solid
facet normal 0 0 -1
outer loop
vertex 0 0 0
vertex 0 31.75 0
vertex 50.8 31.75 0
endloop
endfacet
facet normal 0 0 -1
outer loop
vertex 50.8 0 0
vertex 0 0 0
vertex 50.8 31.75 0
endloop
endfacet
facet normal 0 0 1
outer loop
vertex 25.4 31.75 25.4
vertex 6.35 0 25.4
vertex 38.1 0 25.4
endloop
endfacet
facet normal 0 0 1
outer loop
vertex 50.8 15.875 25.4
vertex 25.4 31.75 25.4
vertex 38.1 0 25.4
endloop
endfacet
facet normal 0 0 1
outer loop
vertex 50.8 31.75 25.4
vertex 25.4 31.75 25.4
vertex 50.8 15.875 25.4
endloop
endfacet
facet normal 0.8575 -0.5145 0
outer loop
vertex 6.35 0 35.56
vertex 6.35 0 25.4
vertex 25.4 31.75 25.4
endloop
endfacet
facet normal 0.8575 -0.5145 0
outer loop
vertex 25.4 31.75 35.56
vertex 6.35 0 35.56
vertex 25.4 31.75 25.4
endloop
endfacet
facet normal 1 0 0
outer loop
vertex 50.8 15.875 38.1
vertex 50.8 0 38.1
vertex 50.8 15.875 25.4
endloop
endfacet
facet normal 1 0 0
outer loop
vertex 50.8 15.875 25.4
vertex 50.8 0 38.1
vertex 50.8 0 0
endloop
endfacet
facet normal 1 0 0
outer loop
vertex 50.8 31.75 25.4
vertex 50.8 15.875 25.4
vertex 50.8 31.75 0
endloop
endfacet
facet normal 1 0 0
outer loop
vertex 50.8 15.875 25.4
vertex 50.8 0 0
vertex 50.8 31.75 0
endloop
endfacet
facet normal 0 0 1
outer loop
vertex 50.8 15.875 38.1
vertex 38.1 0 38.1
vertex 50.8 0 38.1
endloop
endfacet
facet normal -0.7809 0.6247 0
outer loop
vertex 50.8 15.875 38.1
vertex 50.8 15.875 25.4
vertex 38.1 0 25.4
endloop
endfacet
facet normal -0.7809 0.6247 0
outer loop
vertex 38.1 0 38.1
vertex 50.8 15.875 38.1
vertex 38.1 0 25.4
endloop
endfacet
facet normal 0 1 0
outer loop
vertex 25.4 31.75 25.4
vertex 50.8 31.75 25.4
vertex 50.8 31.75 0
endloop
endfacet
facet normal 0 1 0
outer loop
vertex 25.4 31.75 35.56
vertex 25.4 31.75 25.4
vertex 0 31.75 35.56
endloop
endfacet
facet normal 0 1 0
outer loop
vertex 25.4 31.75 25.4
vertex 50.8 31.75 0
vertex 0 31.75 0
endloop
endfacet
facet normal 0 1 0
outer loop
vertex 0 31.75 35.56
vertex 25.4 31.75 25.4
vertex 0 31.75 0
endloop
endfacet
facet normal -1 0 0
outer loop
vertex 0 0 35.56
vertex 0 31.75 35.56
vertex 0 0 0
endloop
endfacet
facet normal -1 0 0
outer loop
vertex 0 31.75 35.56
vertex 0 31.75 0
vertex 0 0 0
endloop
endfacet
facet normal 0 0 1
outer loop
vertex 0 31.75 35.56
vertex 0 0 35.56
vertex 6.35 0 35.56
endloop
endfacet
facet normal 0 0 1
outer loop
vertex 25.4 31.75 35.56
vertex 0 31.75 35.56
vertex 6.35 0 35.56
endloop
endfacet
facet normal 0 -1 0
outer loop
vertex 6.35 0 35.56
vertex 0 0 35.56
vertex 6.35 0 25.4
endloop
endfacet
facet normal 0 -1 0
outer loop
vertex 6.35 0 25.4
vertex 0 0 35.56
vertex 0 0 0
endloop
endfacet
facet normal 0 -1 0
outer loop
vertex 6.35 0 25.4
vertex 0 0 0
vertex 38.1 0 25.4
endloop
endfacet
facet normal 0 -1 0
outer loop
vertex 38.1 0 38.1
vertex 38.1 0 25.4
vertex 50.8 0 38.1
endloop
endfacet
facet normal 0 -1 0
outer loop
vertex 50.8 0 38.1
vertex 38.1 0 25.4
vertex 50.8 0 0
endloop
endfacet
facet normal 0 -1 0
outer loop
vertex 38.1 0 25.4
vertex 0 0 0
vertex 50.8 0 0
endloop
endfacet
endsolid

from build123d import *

# Parameters (mm, degrees)
F0_W     = 50.8
F0_H     = 31.75
F1_DEPTH = 25.4
F3_DEPTH = 10.16
F5_DEPTH = 12.7


with BuildPart() as f1:
    # F0 (on Top) → F1 (new body)
    with BuildSketch(Plane.XY):
        with Locations((25.4, 15.875)):
            Rectangle(F0_W, F0_H)
    extrude(amount=F1_DEPTH)

    # F2 (on face) → F3 (join)
    with BuildSketch(Plane.XY.offset(25.4)):
        Polygon((25.4, 31.75), (0, 31.75), (0, 0), (6.35, 0), align=None)
    extrude(amount=F3_DEPTH)

    # F4 (on face) → F5 (join)
    with BuildSketch(Plane.XY.offset(25.4)):
        Polygon((50.8, 15.875), (38.1, 0), (50.8, 0), align=None)
    extrude(amount=F5_DEPTH)


solid = f1.part
